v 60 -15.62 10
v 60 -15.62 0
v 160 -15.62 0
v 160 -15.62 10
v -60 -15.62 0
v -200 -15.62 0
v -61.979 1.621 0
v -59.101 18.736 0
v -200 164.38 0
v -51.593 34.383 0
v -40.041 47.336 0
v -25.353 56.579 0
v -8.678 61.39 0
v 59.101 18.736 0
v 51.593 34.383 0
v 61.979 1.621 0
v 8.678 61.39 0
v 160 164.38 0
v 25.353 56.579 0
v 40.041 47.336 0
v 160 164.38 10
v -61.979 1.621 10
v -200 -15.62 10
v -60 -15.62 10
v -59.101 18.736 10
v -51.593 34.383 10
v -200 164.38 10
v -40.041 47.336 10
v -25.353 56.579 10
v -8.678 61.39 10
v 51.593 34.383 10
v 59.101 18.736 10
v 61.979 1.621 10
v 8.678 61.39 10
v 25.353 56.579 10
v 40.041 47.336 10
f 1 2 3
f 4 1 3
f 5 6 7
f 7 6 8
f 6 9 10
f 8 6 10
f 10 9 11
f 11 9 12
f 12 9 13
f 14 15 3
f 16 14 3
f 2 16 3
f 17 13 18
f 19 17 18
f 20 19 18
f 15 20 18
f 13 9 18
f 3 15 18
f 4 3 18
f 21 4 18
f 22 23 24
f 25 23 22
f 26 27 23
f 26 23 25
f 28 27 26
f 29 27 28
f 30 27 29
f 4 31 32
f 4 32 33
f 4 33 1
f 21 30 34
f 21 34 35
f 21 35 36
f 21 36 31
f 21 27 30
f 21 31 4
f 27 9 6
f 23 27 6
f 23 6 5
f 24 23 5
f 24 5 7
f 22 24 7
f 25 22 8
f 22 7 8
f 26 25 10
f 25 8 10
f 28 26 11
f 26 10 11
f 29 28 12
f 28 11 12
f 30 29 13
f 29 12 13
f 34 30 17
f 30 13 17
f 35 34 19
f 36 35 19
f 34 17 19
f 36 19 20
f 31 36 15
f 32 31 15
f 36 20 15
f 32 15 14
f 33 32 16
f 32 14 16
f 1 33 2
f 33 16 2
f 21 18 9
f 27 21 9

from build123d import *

# Parameters (mm, degrees)
BOSS_EXTRUDE1_DEPTH = 10


with BuildPart() as part:
    # Sketch2 → Boss-Extrude1 (new body)
    with BuildSketch(Plane.XY):
        with BuildLine():
            Line((-200, 164.379500648), (-200, -15.620499352))
            Line((-200, -15.620499352), (-60, -15.620499352))
            ThreePointArc((-60, -15.620499352), (0, 62), (60, -15.620499352))
            Line((60, -15.620499352), (160, -15.620499352))
            Line((160, -15.620499352), (160, 164.379500648))
            Line((160, 164.379500648), (-200, 164.379500648))
        make_face()
    extrude(amount=BOSS_EXTRUDE1_DEPTH)


solid = part.part
